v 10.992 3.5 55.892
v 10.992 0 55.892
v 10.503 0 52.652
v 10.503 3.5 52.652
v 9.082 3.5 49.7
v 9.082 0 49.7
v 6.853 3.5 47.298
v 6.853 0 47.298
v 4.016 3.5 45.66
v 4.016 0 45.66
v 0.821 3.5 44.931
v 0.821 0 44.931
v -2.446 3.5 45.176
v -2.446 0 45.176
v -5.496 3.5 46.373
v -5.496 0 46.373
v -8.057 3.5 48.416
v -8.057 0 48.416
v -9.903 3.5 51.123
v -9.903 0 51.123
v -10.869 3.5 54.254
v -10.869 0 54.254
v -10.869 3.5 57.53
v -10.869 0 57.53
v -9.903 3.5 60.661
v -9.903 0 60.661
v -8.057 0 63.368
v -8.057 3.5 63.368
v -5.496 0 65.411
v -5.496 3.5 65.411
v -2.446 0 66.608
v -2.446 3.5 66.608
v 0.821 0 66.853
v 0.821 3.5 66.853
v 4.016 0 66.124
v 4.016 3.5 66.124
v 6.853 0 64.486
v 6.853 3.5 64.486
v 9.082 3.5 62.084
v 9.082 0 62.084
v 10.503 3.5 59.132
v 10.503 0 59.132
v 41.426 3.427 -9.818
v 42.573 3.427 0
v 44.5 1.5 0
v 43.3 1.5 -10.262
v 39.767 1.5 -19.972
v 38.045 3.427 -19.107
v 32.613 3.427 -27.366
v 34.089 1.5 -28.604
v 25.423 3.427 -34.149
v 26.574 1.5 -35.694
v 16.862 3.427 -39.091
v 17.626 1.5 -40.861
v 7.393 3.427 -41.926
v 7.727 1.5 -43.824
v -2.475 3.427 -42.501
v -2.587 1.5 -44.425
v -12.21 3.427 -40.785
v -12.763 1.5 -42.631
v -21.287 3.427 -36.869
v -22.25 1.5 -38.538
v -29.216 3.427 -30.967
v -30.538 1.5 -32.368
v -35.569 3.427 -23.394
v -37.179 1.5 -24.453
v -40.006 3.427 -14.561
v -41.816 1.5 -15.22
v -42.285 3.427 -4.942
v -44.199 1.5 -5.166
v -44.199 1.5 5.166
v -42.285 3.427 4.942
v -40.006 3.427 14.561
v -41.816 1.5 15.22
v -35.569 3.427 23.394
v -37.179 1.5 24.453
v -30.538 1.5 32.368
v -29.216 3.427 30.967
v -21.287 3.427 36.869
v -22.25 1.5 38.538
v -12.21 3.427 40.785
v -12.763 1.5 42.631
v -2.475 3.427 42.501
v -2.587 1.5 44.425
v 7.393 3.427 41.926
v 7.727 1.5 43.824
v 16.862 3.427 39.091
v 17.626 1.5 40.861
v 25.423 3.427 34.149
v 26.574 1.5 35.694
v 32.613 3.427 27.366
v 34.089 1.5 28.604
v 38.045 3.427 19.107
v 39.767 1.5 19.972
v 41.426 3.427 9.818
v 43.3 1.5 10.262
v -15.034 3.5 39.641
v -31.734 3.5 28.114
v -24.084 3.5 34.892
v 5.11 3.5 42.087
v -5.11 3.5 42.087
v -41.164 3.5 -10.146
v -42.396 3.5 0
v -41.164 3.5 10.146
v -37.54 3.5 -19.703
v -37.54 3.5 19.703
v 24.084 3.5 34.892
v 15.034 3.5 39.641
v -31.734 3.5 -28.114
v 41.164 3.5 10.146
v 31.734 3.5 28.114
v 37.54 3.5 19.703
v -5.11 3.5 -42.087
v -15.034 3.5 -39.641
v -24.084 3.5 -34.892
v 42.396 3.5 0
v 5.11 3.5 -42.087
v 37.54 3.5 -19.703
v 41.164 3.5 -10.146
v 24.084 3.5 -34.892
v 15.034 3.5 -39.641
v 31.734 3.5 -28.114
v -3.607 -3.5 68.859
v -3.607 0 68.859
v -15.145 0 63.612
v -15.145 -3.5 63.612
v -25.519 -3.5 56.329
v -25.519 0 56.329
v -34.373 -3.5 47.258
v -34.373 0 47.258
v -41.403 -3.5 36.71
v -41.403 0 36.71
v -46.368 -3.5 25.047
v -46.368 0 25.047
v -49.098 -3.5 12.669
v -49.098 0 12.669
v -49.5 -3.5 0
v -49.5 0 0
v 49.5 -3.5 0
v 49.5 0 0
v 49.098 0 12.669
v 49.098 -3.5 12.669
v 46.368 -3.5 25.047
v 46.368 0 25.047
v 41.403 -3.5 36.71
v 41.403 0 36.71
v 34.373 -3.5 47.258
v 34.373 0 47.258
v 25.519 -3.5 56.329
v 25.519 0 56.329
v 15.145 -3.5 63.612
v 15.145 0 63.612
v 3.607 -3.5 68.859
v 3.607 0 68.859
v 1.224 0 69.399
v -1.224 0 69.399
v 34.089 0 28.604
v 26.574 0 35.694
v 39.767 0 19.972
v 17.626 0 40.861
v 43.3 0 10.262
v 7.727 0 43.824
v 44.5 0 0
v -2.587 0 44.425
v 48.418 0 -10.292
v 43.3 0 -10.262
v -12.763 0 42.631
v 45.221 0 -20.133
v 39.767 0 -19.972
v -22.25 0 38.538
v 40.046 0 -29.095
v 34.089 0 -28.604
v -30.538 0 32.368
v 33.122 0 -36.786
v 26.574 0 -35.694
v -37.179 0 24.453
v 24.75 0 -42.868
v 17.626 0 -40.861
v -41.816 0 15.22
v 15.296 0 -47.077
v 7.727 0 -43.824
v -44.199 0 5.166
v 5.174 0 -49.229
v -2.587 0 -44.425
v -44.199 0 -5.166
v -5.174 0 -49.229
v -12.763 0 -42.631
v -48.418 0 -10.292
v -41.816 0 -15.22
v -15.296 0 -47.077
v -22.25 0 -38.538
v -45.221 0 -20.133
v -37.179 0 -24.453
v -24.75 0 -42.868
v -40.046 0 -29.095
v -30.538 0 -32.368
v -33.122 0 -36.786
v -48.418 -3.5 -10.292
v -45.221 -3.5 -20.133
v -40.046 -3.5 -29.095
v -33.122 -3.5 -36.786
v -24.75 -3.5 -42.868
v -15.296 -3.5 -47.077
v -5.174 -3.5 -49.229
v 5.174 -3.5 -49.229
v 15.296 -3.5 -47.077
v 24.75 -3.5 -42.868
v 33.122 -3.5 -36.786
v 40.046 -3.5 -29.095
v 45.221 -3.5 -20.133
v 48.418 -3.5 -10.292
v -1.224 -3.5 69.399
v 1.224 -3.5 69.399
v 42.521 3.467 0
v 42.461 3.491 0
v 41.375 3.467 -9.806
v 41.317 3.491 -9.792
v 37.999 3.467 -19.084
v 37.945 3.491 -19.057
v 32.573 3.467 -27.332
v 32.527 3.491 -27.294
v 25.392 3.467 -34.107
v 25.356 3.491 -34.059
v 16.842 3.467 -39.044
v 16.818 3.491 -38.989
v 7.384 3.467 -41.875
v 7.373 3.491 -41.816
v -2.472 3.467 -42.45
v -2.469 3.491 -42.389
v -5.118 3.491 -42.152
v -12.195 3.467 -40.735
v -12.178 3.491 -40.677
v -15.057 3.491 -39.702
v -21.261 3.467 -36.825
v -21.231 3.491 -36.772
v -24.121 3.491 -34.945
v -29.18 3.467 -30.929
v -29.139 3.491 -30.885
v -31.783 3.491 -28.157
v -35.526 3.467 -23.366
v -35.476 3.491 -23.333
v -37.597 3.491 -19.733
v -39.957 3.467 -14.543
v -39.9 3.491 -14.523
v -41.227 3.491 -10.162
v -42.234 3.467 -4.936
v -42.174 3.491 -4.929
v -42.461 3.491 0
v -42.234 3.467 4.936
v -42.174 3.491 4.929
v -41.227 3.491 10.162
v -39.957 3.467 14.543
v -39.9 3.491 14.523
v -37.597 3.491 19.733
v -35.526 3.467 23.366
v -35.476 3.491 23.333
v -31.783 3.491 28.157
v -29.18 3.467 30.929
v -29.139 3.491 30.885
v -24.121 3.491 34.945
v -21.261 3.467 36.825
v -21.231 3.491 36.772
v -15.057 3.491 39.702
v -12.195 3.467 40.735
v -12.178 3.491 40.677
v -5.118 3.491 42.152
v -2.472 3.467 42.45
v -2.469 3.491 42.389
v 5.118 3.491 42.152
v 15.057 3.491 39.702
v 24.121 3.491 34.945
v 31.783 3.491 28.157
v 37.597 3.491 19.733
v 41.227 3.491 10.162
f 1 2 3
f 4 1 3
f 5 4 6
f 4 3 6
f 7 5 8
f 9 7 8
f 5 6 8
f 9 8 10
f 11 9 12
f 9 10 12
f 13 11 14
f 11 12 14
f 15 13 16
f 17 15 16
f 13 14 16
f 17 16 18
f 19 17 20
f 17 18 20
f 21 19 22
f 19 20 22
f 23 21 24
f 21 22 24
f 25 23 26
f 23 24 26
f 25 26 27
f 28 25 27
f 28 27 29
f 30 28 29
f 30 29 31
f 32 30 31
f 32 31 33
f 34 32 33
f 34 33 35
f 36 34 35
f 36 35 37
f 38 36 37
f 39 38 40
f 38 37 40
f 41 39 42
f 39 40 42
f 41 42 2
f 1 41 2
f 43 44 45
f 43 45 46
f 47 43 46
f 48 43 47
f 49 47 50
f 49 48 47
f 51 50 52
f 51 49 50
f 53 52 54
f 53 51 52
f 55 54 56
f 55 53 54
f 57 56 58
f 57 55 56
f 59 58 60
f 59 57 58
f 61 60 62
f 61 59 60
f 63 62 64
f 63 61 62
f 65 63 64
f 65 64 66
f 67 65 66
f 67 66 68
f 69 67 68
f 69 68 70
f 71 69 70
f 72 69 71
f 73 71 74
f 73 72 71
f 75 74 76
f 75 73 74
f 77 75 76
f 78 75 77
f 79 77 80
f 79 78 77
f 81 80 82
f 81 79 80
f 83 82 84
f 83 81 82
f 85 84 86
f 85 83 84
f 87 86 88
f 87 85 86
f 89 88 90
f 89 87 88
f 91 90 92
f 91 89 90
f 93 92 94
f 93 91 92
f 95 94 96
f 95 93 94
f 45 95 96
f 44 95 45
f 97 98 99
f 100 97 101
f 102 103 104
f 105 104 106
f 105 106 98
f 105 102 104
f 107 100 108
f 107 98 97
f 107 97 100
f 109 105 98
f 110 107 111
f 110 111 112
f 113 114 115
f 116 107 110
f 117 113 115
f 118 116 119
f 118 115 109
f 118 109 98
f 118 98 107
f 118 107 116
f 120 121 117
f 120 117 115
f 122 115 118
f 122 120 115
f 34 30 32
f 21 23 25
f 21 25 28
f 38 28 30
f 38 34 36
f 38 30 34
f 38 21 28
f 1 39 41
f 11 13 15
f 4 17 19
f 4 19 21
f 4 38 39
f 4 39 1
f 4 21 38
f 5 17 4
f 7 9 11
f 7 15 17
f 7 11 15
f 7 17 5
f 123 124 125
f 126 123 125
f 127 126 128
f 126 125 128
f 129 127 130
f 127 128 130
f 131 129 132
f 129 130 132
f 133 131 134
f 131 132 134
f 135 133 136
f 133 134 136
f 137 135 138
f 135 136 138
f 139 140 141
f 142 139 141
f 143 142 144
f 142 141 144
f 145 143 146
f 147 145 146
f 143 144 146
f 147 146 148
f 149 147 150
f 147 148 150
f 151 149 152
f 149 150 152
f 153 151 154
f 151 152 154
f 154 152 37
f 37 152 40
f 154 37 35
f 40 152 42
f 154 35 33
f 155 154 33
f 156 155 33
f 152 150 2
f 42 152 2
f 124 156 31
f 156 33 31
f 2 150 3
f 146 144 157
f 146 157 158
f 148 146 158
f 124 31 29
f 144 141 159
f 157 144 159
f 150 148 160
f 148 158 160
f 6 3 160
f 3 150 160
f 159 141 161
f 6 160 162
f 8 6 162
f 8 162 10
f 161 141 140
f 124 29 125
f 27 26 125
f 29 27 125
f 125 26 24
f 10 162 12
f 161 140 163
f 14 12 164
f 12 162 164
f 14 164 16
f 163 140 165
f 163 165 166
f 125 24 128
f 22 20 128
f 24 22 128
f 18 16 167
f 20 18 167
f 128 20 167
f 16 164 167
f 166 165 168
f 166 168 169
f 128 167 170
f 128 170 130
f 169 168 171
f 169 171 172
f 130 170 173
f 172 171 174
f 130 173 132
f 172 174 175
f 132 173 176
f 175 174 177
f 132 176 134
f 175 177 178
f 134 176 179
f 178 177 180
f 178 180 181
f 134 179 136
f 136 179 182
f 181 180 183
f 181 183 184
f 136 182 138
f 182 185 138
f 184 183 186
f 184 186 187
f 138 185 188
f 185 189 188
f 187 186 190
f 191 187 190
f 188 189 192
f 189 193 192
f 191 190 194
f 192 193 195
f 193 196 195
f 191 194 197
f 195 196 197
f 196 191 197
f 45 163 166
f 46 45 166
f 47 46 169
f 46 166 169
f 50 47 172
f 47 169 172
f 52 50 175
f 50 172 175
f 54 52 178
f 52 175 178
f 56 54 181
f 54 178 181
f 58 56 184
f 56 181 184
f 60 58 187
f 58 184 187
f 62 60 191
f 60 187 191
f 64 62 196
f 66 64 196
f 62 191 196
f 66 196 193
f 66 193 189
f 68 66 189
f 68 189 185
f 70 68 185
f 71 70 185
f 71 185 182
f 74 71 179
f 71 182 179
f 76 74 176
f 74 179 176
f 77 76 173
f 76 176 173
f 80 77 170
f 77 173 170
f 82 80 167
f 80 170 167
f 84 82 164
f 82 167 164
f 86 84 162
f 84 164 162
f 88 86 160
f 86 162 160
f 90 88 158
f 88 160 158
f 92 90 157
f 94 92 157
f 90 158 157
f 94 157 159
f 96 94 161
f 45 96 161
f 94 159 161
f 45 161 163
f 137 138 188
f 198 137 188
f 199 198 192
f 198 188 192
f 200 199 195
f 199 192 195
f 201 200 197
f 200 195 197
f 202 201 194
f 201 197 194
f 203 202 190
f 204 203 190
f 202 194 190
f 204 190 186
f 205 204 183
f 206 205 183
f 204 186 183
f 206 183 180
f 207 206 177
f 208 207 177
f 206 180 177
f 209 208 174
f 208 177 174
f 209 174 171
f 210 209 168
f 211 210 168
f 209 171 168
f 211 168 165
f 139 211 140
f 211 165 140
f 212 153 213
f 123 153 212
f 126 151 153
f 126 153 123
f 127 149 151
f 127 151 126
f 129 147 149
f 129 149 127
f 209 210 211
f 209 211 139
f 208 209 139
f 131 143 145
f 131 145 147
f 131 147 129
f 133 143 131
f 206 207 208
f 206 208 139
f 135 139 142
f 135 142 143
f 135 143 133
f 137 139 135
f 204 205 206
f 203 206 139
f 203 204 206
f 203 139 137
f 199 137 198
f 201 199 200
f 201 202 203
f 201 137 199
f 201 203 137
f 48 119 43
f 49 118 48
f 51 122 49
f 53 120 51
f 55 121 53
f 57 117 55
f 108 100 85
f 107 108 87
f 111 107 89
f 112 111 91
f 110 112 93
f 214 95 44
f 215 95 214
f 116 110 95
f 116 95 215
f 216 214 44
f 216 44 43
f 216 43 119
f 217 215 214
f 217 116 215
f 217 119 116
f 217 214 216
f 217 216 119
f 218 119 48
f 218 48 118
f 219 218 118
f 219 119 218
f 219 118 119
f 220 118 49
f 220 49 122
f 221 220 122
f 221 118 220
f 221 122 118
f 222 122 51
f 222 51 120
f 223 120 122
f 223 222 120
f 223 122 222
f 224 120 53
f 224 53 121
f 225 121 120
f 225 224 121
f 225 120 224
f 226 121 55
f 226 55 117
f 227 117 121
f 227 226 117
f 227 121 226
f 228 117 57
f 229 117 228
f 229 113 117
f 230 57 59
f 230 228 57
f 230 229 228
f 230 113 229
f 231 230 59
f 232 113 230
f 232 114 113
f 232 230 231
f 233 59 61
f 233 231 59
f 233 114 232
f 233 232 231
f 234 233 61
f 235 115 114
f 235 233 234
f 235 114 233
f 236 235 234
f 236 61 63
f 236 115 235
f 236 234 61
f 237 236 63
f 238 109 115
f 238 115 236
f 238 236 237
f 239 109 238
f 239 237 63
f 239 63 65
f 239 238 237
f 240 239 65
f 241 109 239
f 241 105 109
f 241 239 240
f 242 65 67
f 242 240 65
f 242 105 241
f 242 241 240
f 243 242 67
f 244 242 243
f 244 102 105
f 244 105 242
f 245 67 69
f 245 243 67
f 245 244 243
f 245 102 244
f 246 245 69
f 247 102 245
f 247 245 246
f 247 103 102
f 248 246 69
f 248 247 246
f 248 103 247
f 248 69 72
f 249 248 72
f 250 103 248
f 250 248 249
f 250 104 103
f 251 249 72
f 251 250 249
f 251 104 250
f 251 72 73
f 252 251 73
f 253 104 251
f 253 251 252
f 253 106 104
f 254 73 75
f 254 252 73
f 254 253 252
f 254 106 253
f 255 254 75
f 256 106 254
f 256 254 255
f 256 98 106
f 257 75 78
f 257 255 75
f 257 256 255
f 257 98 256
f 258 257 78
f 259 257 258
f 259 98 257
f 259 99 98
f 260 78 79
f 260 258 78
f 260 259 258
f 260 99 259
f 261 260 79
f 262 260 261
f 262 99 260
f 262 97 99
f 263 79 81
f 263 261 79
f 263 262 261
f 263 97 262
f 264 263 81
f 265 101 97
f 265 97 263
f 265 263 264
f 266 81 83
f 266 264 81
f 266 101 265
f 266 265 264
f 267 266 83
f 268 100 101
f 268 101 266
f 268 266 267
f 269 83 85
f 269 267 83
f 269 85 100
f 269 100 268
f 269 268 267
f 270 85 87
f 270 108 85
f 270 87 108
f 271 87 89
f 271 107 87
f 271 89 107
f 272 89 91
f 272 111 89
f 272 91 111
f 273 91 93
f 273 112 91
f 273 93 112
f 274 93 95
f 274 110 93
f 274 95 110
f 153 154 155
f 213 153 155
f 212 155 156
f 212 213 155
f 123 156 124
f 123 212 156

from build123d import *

# Parameters (mm, degrees)
SKETCH1_R           = 44.5
BOSS_EXTRUDE1_DEPTH = 3.5
CHAMFER1_SIZE       = 2
SKETCH2_R           = 49.5
BOSS_EXTRUDE2_DEPTH = 3.5
BOSS_EXTRUDE3_DEPTH = 3.5
SKETCH7_R           = 10.991686932
BOSS_EXTRUDE4_DEPTH = 3.5
FILLET1_R           = 11
FILLET2_R           = 0.25


with BuildPart() as part:
    # Sketch1 → Boss-Extrude1 (new body)
    with BuildSketch(Plane(origin=(0, 0, 0), x_dir=(1, 0, 0), z_dir=(0, 1, 0))):
        Circle(SKETCH1_R)
    extrude(amount=BOSS_EXTRUDE1_DEPTH)

    # Chamfer1
    chamfer1_edges = [part.edges().sort_by_distance(p)[0] for p in [
        (-44.5, 3.5, 0),
    ]]
    chamfer(chamfer1_edges, length=CHAMFER1_SIZE)

    # Sketch2 → Boss-Extrude2 (add)
    with BuildSketch(Plane.XZ):
        Circle(SKETCH2_R)
    extrude(amount=BOSS_EXTRUDE2_DEPTH)

    # Sketch3 → Boss-Extrude3 (add)
    with BuildSketch(Plane(origin=(0, 0, 0), x_dir=(1, 0, 0), z_dir=(0, 1, 0))):
        with BuildLine():
            ThreePointArc((49.5, 0), (37.061785537, -43.706191201), (0, -70))
            ThreePointArc((0, -70), (-37.061785537, -43.706191201), (-49.5, 0))
            ThreePointArc((-49.5, 0), (0, -49.5), (49.5, 0))
        make_face()
    extrude(amount=-BOSS_EXTRUDE3_DEPTH)

    # Sketch7 → Boss-Extrude4 (add)
    with BuildSketch(Plane(origin=(0, 0, 0), x_dir=(1, 0, 0), z_dir=(0, 1, 0))):
        with Locations((0, -55.892027532)):
            Circle(SKETCH7_R)
    extrude(amount=BOSS_EXTRUDE4_DEPTH)

    # Fillet1
    fillet1_edges = [part.edges().sort_by_distance(p)[0] for p in [
        (0, -1.75, 70),
    ]]
    fillet(fillet1_edges, radius=FILLET1_R)

    # Fillet2
    fillet2_edges = [part.edges().sort_by_distance(p)[0] for p in [
        (-42.5, 3.5, 0),
    ]]
    fillet(fillet2_edges, radius=FILLET2_R)


solid = part.part
